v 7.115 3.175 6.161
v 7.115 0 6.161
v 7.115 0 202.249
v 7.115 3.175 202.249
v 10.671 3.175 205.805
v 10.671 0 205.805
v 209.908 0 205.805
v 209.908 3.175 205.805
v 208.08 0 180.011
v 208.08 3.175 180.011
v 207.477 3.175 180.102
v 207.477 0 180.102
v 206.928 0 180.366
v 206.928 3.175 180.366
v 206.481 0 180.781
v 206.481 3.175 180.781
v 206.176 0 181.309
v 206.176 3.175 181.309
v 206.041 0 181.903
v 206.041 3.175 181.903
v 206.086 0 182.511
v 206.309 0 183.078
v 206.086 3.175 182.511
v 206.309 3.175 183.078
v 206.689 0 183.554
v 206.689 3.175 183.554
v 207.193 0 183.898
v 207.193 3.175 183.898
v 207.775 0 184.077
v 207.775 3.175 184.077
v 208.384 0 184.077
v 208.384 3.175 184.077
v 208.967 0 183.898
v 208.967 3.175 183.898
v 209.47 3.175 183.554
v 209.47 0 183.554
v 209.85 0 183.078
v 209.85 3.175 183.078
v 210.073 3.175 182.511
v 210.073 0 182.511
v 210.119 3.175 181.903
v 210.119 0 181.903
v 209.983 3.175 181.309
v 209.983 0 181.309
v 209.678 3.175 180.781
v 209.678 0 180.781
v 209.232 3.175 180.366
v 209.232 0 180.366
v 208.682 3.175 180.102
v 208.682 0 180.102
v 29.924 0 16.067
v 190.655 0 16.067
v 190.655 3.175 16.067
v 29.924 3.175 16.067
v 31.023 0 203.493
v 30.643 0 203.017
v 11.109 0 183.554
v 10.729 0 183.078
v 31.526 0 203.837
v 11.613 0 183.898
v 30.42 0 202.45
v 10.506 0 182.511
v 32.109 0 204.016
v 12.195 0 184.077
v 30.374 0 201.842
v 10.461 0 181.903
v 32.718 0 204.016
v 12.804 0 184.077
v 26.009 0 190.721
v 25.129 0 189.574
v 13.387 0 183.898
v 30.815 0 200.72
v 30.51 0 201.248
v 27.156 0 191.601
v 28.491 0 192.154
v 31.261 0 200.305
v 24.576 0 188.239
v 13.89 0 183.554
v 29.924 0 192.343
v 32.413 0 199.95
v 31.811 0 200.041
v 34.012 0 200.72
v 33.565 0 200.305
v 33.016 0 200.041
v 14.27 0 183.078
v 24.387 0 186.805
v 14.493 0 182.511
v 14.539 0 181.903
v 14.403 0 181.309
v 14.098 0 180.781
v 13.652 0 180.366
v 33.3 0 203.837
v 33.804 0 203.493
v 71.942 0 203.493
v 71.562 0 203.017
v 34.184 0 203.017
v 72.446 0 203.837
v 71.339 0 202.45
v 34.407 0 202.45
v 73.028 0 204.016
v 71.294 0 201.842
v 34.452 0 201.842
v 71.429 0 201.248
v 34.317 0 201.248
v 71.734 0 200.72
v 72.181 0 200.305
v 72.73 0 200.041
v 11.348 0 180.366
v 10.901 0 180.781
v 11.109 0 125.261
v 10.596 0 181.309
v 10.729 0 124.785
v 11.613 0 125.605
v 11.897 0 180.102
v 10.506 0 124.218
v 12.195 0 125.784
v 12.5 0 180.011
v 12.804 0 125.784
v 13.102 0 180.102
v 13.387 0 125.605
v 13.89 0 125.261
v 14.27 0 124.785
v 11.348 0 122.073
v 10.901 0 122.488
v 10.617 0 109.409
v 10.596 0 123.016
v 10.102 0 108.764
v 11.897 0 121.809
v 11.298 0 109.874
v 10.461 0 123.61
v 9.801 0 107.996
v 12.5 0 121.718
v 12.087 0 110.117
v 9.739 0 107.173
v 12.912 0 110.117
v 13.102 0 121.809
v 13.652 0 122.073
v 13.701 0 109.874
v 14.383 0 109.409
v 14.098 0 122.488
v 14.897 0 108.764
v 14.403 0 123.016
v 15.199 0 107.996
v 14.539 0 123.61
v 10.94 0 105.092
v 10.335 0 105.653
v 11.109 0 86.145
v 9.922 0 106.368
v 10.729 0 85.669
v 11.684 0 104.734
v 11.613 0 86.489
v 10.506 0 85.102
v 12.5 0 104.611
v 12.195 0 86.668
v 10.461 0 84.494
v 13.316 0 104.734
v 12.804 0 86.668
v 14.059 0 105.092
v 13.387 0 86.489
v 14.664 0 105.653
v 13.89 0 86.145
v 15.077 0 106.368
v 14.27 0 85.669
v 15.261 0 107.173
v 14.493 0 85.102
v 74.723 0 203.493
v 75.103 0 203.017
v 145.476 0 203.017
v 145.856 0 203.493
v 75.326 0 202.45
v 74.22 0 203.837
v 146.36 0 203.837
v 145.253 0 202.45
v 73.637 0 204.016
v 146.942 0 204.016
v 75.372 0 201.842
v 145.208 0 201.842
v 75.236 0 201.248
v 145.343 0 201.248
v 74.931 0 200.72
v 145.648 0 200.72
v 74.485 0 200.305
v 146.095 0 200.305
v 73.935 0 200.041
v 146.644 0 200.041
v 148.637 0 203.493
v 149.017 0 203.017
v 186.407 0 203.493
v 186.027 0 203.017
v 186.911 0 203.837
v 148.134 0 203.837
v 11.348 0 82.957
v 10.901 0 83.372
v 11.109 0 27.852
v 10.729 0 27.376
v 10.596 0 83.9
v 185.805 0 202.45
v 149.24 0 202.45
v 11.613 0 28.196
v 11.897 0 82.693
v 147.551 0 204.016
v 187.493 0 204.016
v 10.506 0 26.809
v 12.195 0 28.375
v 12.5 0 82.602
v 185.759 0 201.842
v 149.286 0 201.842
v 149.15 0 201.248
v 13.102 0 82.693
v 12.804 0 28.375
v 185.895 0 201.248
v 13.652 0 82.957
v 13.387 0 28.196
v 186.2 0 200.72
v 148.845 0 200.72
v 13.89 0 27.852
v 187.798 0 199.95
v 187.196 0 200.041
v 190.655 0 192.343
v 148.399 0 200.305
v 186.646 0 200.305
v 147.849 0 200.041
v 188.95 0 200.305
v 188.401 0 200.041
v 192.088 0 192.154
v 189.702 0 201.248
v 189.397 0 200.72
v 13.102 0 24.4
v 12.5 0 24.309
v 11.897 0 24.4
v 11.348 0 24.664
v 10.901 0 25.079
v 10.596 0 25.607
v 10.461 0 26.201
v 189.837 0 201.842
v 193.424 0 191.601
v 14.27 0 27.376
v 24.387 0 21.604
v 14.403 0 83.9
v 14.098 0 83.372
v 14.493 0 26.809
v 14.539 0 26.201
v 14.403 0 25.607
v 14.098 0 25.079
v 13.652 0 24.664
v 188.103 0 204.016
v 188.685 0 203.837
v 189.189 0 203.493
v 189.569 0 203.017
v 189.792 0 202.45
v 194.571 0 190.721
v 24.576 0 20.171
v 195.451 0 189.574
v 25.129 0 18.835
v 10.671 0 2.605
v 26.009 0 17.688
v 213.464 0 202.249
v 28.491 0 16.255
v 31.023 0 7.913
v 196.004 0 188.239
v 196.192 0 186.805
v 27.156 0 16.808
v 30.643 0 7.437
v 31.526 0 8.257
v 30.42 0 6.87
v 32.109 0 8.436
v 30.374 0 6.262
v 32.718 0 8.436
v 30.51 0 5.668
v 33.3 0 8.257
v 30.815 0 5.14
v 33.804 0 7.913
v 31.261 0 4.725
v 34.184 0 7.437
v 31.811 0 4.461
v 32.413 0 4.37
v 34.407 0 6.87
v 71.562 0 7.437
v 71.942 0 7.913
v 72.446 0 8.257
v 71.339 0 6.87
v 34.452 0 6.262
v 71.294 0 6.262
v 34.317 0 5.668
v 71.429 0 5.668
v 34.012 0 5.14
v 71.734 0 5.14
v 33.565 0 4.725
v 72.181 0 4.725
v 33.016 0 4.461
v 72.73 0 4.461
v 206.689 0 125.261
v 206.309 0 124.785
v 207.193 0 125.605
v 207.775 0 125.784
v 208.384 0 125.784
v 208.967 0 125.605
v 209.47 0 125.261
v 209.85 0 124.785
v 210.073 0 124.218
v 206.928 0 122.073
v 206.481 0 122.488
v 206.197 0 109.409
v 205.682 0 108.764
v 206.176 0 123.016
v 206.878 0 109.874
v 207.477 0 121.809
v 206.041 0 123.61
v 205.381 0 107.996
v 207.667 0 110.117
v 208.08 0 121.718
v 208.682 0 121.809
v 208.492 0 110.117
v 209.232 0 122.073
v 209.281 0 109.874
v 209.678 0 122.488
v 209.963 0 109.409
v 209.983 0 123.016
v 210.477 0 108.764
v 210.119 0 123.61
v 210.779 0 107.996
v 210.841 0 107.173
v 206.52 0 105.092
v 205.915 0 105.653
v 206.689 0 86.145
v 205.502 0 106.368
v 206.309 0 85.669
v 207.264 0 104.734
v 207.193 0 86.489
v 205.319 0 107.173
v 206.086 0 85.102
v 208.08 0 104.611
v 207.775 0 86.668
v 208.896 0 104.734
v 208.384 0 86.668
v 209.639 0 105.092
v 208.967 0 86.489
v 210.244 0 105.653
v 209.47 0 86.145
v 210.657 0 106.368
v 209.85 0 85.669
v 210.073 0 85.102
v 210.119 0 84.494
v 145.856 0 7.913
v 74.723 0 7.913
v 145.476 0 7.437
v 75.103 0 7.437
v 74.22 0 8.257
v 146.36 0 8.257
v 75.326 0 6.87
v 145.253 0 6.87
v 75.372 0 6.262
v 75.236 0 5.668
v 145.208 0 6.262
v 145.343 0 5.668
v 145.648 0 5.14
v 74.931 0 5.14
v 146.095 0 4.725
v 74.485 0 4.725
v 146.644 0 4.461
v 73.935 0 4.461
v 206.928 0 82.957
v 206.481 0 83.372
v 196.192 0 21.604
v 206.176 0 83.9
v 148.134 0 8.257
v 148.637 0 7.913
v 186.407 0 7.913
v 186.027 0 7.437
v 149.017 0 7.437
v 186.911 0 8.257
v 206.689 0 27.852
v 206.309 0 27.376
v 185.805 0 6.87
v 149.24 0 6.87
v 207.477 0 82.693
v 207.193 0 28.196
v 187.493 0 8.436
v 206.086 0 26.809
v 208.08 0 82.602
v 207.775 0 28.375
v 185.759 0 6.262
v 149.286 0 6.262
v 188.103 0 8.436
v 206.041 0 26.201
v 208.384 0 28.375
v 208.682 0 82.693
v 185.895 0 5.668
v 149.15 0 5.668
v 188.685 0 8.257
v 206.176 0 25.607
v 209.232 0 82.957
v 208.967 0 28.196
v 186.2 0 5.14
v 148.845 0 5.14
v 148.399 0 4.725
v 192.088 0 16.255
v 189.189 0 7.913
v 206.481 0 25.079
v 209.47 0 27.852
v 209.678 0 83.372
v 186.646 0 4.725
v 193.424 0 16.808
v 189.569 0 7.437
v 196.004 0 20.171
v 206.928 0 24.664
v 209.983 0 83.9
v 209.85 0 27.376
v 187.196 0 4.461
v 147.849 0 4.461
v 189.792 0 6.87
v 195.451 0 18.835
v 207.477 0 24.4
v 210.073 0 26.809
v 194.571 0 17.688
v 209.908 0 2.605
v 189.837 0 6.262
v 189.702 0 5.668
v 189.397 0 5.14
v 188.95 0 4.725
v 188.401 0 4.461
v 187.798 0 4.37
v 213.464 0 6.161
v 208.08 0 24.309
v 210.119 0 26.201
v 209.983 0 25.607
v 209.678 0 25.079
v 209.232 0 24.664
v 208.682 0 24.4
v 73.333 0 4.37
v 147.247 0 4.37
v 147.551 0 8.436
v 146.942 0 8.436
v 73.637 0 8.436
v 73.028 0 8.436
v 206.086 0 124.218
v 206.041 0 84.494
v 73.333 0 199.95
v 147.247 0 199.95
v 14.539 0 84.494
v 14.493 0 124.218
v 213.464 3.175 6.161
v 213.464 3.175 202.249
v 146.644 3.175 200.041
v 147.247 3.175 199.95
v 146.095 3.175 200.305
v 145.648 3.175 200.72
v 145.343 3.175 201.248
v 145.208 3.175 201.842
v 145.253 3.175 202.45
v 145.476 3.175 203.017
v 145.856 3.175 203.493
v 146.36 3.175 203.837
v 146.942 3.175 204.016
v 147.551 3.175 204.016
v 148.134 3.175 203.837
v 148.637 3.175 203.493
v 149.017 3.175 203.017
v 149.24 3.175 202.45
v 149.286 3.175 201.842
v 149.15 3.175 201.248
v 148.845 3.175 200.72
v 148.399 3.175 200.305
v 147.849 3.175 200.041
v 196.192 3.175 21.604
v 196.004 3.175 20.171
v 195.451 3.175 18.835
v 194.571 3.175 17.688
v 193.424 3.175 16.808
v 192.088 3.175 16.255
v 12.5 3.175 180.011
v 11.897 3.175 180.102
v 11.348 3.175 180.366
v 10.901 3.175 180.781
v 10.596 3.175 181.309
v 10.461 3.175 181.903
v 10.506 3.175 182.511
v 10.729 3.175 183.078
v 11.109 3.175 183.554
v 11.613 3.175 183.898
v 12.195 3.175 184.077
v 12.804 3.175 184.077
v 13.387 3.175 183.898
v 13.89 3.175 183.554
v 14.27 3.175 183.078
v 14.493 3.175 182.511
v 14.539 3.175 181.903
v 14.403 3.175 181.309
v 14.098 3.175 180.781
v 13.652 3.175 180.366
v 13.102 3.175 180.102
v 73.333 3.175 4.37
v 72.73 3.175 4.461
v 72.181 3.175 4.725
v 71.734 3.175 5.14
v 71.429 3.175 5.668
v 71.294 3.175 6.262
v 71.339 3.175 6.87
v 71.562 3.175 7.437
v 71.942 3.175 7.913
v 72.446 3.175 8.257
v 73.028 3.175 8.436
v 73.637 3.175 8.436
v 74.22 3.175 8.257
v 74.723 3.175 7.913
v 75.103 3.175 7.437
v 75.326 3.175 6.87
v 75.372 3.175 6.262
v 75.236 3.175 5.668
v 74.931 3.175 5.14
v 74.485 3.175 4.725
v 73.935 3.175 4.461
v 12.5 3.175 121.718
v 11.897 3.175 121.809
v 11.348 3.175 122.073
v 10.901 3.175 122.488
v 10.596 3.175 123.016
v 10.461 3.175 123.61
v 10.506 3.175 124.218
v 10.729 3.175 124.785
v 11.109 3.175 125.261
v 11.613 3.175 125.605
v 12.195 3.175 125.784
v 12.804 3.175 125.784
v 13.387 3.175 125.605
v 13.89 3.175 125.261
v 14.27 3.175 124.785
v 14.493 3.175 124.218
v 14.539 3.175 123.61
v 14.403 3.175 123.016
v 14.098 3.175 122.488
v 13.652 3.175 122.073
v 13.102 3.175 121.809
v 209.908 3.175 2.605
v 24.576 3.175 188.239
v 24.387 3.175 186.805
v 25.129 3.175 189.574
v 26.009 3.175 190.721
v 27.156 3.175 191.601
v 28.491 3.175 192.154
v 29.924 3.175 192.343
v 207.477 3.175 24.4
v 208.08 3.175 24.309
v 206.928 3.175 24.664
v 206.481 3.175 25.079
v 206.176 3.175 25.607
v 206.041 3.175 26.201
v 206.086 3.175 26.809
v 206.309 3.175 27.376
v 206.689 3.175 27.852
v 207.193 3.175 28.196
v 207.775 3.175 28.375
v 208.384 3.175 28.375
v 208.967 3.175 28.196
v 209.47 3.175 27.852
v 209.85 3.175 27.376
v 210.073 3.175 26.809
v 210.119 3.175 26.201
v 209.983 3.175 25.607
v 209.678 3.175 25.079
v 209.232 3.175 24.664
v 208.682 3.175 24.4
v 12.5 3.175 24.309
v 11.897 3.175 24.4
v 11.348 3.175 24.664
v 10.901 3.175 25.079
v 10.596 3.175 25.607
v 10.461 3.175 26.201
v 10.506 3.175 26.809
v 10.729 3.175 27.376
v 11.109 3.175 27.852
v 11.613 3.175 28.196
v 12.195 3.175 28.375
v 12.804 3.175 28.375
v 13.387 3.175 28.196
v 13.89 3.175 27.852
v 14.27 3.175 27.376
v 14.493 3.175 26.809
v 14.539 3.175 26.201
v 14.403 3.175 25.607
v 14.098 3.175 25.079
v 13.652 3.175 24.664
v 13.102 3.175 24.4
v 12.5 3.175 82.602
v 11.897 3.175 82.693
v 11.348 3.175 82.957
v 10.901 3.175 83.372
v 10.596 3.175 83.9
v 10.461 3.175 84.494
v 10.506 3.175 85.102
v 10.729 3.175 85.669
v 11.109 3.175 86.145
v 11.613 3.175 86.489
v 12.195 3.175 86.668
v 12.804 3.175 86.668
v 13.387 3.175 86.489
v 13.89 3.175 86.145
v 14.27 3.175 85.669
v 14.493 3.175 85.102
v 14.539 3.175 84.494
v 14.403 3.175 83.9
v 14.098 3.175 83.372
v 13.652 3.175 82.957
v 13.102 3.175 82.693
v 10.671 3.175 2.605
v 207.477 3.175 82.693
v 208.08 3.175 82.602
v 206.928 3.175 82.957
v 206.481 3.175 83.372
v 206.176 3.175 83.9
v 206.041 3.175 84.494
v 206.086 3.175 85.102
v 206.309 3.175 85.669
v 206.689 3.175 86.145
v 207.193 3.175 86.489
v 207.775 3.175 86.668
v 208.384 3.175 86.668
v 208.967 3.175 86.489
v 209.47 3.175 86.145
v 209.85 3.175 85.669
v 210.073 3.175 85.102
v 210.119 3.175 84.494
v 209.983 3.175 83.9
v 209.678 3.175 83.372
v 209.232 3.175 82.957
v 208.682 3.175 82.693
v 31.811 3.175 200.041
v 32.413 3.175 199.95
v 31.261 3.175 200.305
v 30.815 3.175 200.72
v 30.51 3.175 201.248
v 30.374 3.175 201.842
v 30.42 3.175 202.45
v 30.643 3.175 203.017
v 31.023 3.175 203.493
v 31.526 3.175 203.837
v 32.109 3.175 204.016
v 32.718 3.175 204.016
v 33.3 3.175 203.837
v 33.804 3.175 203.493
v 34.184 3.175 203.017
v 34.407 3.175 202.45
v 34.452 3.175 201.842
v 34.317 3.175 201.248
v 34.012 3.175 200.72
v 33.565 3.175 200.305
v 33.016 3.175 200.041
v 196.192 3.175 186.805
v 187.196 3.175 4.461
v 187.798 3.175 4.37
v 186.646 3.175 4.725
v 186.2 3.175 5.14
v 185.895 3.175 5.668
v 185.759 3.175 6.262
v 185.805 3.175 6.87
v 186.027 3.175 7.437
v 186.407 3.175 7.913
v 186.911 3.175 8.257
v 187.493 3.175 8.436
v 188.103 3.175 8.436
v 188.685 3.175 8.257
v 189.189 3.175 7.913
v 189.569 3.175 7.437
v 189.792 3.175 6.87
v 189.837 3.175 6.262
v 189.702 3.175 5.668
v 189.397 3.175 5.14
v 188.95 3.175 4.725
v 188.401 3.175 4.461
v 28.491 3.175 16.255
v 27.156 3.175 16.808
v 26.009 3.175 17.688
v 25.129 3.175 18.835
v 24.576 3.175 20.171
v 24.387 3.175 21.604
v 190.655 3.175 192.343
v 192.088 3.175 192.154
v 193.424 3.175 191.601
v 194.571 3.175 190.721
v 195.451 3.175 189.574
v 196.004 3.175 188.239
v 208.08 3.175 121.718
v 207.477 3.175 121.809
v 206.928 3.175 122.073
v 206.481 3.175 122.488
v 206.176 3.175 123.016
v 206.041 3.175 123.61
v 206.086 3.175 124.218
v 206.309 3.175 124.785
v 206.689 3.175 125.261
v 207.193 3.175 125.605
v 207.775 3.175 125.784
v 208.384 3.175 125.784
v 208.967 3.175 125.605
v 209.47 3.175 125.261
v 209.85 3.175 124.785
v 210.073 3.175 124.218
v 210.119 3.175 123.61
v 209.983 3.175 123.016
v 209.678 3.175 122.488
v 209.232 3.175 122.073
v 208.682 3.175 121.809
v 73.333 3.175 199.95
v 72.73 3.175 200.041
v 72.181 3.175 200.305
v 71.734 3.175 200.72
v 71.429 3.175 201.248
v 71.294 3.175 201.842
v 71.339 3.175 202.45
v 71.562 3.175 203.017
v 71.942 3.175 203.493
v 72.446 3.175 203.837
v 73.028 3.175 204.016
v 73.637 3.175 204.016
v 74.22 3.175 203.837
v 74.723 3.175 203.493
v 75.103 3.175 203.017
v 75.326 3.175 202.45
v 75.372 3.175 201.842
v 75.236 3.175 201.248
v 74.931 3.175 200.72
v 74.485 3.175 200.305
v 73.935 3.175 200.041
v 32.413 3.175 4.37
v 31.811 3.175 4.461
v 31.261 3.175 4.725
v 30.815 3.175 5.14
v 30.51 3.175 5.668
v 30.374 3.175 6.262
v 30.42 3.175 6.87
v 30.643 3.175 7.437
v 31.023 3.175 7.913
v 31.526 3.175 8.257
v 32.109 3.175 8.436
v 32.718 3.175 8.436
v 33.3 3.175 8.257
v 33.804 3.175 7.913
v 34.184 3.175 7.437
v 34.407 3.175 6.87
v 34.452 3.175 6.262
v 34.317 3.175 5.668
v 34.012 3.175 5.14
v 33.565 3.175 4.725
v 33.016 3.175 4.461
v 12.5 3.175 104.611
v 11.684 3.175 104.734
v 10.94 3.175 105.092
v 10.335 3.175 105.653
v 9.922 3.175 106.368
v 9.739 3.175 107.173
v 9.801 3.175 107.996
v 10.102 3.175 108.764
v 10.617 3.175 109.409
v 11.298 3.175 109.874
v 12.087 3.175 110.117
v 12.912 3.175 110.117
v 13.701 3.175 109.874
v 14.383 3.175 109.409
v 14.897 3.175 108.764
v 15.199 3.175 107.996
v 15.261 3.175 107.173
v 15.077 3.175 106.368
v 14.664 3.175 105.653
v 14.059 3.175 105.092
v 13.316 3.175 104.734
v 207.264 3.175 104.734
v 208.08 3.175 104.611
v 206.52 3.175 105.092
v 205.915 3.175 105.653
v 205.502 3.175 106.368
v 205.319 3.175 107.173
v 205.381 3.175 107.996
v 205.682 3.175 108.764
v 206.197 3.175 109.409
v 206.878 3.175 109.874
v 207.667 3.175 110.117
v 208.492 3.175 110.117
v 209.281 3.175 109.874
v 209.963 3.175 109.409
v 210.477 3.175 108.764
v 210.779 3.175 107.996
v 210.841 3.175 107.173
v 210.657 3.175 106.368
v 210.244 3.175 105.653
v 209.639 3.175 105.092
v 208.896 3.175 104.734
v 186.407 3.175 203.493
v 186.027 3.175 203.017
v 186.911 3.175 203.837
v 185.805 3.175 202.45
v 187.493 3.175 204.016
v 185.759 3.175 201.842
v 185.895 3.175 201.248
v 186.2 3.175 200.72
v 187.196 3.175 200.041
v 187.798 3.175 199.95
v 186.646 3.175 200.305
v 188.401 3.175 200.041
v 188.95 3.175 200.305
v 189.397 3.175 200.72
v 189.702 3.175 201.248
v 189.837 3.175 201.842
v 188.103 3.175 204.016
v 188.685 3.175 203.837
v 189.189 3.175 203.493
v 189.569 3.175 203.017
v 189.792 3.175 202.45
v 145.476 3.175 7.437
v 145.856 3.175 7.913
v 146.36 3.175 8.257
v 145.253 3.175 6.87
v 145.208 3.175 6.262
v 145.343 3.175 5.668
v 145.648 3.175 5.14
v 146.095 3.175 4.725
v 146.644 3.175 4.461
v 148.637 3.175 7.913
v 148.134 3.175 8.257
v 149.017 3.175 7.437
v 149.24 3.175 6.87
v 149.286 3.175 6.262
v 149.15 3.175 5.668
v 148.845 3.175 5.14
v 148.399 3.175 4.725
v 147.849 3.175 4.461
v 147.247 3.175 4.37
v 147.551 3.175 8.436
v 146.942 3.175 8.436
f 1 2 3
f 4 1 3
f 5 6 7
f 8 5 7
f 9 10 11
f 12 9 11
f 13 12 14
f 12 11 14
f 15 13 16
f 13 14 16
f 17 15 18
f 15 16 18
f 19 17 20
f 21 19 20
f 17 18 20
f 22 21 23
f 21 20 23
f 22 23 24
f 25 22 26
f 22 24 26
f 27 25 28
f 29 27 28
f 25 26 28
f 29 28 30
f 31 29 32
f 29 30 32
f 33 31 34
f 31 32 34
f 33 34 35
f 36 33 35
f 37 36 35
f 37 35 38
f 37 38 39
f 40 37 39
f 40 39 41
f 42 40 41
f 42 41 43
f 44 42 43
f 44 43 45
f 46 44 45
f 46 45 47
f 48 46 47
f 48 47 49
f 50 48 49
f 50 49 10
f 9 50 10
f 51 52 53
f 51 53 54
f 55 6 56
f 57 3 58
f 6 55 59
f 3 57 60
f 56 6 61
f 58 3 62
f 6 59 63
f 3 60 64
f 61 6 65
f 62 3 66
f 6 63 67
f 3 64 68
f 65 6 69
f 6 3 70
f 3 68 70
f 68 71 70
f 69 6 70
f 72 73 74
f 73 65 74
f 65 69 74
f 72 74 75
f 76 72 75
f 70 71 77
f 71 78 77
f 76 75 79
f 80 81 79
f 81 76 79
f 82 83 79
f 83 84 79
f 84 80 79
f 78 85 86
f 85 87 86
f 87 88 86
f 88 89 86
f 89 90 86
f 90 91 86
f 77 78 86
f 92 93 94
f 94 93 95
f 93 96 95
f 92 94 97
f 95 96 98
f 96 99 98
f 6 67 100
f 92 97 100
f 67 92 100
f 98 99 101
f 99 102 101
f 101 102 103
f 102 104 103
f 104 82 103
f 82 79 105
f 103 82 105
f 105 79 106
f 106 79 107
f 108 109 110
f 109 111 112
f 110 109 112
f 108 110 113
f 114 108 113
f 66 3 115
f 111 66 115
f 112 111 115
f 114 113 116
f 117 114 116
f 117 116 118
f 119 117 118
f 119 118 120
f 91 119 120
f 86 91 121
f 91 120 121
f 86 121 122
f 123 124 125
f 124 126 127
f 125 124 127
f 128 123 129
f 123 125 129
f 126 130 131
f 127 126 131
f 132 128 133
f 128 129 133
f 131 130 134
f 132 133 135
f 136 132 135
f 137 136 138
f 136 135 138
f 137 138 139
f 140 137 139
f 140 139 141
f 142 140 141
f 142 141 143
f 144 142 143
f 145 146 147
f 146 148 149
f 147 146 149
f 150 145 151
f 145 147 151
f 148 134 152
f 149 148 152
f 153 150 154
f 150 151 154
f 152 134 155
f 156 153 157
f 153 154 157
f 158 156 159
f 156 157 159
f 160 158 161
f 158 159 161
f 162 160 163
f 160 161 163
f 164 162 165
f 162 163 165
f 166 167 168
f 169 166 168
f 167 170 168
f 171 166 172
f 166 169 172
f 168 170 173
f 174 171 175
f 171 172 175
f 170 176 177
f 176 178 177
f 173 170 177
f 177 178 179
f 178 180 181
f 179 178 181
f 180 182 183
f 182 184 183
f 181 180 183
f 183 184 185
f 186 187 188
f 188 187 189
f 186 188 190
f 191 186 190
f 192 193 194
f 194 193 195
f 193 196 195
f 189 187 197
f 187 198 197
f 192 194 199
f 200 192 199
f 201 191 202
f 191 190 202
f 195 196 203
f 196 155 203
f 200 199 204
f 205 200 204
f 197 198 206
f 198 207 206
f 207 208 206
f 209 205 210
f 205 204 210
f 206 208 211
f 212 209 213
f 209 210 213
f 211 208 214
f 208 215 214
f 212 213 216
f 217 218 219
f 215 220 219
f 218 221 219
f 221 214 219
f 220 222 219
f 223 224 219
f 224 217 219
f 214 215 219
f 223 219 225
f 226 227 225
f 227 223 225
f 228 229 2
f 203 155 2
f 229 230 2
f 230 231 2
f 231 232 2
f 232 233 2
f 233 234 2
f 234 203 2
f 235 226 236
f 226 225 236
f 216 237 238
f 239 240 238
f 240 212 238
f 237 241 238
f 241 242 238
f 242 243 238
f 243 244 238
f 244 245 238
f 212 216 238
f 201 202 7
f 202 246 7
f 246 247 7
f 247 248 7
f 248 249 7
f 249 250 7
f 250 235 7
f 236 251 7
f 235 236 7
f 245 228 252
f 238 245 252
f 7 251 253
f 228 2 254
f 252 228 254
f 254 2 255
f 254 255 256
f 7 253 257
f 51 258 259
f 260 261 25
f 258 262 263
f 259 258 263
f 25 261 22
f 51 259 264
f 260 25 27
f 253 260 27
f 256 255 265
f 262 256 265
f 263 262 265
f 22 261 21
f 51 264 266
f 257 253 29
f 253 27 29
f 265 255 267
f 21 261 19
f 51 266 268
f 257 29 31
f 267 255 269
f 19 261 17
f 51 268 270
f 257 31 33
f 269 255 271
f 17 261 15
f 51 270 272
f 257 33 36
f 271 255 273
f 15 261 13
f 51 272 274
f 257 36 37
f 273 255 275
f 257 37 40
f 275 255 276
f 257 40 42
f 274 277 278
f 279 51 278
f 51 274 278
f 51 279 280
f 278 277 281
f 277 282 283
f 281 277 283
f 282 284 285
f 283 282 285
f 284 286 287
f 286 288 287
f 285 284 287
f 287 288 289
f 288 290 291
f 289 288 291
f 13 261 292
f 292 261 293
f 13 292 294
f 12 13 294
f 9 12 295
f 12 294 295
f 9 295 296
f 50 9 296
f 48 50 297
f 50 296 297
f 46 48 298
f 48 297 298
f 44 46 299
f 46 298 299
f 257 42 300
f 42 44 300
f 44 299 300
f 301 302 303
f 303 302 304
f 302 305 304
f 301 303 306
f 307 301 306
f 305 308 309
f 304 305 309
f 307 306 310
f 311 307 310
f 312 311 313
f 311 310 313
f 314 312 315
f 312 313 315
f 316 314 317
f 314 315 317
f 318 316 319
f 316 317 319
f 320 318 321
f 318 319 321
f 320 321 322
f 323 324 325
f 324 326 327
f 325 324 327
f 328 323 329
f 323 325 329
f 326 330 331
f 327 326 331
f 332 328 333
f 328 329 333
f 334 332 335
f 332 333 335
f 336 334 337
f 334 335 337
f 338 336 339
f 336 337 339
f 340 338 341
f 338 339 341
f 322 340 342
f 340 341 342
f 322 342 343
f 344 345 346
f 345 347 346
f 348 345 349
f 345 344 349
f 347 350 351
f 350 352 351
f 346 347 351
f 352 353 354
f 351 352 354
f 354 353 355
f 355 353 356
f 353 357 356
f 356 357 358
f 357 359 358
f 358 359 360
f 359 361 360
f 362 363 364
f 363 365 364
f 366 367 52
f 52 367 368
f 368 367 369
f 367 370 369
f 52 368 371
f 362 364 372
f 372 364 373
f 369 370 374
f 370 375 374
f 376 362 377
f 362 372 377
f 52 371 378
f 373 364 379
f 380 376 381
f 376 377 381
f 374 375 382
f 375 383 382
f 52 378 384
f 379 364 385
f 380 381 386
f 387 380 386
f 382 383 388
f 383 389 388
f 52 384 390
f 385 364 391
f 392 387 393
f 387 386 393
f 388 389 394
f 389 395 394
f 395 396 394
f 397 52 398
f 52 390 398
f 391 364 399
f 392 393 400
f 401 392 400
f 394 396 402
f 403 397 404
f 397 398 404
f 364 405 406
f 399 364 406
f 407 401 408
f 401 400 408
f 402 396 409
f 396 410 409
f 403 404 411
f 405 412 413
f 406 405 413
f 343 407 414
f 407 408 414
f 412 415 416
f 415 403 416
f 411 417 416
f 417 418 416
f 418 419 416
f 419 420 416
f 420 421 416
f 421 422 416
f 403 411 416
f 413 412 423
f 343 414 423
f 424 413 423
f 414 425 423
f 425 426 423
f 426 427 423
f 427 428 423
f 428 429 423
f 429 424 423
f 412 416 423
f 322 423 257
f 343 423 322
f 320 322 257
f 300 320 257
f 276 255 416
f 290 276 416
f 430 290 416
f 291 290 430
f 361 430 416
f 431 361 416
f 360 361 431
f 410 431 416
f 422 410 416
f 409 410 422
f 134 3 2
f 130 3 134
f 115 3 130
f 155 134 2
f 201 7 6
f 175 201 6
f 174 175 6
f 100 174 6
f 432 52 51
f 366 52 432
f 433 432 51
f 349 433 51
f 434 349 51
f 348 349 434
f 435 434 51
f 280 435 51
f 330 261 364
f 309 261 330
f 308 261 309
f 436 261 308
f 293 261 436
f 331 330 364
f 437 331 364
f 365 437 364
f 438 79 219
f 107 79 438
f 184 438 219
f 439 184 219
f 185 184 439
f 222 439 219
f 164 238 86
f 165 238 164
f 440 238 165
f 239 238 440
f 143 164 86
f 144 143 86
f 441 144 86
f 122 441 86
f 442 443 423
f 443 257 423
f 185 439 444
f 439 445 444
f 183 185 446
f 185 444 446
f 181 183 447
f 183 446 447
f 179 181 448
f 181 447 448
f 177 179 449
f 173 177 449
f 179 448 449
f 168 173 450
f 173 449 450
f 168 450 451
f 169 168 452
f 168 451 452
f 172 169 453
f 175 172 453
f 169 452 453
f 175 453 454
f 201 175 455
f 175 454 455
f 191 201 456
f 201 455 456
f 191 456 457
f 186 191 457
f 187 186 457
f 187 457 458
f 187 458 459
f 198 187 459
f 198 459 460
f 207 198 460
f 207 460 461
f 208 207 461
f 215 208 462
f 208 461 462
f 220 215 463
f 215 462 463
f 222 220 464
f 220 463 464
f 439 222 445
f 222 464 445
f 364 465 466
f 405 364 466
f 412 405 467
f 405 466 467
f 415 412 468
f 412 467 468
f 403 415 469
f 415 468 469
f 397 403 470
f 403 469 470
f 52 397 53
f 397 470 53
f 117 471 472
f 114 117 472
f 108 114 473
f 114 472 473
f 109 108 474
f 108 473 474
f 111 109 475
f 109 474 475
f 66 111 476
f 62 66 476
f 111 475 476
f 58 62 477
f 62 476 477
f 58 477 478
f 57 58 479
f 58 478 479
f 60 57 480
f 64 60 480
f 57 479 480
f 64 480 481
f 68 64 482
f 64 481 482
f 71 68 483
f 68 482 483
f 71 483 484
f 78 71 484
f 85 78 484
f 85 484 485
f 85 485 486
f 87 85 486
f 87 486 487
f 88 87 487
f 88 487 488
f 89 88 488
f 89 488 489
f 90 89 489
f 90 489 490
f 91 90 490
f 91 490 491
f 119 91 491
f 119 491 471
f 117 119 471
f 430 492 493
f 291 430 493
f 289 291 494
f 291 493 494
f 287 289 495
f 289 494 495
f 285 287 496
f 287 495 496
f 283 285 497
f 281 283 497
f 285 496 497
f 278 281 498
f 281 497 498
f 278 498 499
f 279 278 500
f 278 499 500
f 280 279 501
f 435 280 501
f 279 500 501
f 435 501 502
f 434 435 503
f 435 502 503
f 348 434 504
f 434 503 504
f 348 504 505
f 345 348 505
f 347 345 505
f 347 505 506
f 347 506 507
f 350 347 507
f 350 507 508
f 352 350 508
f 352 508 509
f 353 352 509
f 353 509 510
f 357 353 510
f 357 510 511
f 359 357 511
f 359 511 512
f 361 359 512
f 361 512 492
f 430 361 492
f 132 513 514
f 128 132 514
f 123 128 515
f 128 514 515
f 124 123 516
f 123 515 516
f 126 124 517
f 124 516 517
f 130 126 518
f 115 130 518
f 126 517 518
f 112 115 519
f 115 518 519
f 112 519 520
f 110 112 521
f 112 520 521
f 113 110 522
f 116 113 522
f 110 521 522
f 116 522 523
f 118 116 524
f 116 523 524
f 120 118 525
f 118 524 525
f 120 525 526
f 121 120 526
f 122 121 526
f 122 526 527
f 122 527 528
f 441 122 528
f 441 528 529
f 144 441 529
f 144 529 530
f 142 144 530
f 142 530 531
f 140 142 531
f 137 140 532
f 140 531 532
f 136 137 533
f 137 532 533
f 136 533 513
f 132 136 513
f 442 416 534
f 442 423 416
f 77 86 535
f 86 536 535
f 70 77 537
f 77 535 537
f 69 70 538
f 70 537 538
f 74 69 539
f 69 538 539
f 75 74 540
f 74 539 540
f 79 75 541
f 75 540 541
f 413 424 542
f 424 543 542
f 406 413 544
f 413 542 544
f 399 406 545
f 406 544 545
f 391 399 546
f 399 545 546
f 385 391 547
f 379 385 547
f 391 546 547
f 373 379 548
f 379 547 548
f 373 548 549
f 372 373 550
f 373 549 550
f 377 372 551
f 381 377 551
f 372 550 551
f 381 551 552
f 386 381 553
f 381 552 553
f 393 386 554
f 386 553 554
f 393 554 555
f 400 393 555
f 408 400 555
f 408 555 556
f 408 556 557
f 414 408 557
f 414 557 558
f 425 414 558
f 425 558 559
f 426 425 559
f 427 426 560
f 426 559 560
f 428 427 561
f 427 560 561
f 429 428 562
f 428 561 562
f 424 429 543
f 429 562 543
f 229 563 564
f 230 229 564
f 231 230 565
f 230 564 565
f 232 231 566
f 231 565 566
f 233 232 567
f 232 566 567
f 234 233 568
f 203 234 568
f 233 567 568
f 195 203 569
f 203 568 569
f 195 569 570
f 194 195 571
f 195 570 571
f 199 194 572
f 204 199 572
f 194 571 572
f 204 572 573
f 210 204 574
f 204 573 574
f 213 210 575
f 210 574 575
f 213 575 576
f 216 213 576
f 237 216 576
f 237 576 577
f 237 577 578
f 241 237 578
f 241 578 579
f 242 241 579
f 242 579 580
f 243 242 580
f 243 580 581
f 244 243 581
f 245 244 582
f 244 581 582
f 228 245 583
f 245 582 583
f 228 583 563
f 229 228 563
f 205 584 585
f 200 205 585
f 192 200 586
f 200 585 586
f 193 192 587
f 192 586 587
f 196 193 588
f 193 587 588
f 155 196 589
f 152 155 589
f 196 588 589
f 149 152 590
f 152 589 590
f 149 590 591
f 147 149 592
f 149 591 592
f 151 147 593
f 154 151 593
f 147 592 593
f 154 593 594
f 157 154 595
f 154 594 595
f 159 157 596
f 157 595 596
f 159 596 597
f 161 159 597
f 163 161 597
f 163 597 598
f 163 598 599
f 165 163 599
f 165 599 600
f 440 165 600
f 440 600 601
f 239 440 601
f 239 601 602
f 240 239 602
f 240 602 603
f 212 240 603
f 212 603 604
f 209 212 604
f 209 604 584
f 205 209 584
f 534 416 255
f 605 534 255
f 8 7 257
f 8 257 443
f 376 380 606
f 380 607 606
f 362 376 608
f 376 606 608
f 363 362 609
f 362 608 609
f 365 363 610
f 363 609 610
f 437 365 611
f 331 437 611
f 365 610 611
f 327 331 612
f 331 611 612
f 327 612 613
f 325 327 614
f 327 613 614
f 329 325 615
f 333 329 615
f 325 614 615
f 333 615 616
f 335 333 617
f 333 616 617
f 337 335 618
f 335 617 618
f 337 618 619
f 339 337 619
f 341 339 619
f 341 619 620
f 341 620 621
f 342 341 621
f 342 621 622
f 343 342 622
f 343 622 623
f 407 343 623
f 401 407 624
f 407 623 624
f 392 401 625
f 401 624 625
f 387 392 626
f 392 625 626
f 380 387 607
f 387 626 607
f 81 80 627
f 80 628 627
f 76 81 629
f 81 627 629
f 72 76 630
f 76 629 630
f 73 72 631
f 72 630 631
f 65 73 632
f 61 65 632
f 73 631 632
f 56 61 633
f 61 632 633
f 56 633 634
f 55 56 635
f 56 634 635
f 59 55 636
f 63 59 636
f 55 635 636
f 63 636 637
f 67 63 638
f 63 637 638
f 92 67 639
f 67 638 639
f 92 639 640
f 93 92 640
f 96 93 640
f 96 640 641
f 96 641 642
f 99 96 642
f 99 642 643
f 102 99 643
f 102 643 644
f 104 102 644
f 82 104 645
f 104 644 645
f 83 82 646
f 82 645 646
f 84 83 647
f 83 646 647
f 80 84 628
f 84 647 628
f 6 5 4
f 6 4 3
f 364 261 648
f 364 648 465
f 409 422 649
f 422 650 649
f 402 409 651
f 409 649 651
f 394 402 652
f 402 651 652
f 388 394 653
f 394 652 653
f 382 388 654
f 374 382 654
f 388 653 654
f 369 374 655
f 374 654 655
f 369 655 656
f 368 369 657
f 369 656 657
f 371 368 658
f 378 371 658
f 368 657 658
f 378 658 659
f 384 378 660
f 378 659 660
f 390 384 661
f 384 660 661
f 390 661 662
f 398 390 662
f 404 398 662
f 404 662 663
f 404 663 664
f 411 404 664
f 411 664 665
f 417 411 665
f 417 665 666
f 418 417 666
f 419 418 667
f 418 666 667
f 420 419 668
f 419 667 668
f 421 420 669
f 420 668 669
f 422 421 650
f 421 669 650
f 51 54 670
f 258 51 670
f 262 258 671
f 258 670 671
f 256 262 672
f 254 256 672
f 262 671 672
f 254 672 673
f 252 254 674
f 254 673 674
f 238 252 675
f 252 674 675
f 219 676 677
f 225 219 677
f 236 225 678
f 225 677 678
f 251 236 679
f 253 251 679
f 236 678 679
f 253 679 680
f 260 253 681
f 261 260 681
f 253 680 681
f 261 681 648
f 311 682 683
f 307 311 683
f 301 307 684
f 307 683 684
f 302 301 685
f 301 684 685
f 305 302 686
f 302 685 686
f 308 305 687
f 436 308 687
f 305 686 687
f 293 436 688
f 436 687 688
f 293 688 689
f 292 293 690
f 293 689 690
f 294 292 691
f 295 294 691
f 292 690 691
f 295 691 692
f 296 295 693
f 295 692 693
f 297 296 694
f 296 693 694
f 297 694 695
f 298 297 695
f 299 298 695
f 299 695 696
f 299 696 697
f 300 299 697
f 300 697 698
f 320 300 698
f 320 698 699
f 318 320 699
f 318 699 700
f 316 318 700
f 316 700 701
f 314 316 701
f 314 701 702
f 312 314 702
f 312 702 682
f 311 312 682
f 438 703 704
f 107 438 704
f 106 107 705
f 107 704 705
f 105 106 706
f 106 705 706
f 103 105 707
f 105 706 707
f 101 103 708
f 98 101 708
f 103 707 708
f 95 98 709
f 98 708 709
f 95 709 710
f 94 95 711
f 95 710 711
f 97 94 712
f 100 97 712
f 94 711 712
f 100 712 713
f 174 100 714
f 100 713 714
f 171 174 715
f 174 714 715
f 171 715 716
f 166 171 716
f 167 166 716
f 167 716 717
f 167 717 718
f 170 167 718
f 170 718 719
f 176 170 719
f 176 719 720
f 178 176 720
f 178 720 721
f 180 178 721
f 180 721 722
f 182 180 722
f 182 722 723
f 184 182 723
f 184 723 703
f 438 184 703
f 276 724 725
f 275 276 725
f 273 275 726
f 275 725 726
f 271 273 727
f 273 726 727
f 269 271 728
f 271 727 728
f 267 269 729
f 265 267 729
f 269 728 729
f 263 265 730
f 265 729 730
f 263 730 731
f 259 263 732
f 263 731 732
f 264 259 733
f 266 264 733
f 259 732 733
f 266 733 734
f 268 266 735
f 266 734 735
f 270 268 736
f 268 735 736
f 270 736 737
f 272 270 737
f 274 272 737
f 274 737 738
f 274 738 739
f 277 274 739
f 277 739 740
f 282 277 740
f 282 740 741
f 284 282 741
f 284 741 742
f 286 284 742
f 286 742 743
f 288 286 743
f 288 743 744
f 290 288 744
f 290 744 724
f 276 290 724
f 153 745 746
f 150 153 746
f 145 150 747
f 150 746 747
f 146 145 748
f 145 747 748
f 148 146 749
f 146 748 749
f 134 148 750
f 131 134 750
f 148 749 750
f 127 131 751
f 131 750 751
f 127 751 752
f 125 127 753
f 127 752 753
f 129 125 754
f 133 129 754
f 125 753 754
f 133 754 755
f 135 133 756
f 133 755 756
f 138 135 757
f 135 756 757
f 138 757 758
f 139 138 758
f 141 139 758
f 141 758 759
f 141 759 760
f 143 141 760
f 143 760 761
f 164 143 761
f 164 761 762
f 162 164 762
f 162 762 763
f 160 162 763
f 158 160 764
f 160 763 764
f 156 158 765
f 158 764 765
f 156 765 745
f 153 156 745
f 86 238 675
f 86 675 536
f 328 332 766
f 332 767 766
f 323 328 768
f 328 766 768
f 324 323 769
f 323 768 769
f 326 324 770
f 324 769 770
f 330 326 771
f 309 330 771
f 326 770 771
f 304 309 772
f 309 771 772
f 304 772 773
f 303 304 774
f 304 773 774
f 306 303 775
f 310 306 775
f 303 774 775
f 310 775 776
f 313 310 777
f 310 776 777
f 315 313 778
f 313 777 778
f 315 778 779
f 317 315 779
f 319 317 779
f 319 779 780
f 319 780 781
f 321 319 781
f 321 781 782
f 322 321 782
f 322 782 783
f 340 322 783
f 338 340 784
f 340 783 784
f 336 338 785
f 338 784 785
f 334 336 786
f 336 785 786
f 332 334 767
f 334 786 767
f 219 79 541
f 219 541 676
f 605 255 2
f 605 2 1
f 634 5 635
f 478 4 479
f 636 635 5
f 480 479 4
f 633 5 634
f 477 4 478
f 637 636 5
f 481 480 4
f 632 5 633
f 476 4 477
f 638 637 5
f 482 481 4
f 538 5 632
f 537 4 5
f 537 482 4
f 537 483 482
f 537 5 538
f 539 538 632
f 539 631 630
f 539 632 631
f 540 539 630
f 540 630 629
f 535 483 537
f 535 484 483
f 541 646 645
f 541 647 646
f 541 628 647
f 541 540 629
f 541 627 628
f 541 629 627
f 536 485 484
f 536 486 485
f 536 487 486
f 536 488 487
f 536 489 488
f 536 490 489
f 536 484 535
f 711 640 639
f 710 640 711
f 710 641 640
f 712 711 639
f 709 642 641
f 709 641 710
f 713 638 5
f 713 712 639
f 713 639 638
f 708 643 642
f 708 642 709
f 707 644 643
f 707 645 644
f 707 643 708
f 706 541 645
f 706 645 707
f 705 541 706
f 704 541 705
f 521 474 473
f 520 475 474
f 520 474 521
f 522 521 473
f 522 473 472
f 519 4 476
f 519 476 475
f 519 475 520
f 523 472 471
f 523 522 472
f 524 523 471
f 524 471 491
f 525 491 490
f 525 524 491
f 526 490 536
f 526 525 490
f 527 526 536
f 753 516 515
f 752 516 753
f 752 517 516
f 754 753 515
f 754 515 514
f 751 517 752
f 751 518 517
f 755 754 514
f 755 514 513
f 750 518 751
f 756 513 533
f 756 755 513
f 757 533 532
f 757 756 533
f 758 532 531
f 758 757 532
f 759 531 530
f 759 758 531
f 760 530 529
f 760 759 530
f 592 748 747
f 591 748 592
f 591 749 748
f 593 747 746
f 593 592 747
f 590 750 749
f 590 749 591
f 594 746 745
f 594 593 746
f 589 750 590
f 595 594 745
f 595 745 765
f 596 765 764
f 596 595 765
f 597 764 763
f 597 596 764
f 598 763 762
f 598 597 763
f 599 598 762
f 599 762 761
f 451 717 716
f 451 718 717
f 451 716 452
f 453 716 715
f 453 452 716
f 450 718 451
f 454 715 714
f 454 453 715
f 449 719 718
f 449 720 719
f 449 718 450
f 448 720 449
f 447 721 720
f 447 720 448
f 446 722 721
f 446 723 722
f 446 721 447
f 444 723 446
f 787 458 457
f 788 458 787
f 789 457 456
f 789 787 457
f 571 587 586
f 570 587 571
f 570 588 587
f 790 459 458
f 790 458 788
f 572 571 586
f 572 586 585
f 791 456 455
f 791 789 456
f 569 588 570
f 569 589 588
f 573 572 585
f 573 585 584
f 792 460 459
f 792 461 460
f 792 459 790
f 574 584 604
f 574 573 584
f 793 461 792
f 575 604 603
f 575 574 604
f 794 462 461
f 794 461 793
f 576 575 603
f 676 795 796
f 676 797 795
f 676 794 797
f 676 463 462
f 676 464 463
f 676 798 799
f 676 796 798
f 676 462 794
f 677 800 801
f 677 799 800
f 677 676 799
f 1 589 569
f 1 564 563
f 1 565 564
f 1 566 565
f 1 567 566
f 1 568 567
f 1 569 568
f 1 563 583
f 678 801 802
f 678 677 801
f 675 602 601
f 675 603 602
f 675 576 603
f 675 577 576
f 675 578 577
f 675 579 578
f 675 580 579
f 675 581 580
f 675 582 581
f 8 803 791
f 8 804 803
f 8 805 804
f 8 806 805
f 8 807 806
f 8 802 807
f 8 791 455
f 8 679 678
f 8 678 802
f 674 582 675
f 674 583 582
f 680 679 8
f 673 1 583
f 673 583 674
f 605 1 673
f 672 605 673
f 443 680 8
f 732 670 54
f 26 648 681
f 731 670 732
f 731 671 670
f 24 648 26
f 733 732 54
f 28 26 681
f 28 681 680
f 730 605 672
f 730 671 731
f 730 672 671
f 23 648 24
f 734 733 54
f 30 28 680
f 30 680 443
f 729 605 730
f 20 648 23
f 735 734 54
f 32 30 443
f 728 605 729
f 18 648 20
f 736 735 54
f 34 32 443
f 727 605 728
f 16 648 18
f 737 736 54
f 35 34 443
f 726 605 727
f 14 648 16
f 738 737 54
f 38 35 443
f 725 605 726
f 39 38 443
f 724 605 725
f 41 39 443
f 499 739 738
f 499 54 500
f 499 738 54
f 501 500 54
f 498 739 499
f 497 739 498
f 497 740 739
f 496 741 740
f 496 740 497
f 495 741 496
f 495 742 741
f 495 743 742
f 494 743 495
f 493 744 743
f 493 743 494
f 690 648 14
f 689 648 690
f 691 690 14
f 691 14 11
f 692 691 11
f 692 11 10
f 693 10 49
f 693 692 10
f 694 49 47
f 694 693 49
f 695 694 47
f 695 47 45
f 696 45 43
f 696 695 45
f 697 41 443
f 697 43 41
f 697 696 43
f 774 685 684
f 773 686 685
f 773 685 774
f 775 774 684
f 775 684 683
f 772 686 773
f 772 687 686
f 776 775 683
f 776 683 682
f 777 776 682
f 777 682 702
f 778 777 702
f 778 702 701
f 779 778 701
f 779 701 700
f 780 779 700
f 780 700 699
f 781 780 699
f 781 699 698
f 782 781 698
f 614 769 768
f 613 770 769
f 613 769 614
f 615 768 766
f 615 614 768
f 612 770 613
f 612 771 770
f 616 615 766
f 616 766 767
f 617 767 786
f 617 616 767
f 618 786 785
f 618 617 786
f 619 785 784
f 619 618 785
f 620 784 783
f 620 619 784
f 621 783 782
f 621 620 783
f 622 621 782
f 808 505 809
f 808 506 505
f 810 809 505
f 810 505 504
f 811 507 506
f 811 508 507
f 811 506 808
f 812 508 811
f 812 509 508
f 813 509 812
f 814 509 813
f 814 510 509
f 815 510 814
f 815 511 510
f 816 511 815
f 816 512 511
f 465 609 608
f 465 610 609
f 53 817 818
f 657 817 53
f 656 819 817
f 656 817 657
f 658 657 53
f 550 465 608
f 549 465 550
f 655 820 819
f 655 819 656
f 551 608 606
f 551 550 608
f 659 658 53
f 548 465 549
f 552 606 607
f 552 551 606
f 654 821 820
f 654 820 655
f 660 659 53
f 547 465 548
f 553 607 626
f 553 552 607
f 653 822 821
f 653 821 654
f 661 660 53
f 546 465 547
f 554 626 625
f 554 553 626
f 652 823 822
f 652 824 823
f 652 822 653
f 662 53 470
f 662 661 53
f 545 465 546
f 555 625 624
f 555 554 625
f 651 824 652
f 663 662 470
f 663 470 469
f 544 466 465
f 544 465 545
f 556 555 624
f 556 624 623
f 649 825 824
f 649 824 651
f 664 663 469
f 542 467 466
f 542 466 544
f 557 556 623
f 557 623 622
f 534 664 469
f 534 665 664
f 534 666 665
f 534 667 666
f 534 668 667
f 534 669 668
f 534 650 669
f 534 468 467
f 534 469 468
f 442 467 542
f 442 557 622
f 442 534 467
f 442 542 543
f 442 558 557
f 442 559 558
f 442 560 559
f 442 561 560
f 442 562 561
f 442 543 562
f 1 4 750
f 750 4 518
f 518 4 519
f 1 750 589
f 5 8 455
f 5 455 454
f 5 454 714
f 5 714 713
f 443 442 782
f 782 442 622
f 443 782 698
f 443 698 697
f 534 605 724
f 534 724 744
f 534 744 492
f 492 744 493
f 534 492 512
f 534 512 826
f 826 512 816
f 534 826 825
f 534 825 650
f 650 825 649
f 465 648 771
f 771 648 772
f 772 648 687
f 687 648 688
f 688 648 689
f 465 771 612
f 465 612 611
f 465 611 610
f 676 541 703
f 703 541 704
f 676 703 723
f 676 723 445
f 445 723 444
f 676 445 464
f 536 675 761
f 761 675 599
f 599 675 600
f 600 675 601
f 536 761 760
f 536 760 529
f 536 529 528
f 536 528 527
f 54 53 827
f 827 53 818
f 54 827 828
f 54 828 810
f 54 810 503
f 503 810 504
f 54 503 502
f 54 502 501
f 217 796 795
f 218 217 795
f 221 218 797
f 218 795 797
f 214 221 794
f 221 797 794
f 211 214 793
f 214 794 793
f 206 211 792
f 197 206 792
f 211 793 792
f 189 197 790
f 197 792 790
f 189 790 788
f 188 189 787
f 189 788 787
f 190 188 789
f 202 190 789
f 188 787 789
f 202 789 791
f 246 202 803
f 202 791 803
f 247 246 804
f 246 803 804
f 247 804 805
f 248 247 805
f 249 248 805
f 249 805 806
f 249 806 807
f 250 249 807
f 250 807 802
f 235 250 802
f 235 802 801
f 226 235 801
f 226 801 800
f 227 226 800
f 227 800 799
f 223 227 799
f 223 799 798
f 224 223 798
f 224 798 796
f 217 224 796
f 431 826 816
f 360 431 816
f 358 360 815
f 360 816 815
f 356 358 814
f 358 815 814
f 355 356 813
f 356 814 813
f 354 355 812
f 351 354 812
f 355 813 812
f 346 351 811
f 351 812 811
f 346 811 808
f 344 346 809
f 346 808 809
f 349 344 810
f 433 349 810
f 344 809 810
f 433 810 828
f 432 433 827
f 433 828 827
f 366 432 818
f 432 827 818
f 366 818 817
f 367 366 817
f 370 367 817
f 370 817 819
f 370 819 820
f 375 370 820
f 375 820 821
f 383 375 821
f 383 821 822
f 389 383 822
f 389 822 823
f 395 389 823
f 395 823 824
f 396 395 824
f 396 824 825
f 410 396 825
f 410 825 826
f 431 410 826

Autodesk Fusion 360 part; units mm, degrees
sketch "Front" plane through (0, 0, 0) normal (0, 1, 0) x (1, 0, 0) in component "1006350A"
  line L0 (-97.5923, -201.9946) -> (221.2351, -201.9946) construction
  line L1 (-99.947, -6.4146) -> (290.3014, -6.4146) construction
  line L2 (12.4997, 61.7326) -> (12.4997, -271.4585) construction
  line L3 (208.0797, 69.9741) -> (208.0797, -187.16) construction
  line L4 (213.4645, 13.4611) -> (213.4645, -265.3363) construction
  line L5 (7.1149, -256.6239) -> (7.1149, 6.397) construction
  line L6 (-10.9391, -2.6046) -> (257.2621, -2.6046) construction
  line L7 (3.4246, -205.8046) -> (275.1579, -205.8046) construction
  line L8 (196.1925, -231.664) -> (196.1925, 4.0423) construction
  line L9 (200.5105, 72.0933) -> (200.5105, -273.8132) construction
  line L10 (20.3229, -271.4585) -> (20.3229, 19.5833) construction
  line L11 (-9.5263, -26.3536) -> (218.174, -26.3536) construction
  line L12 (-30.2477, -84.6466) -> (216.2902, -84.6466) construction
  line L13 (226.8864, -107.3796) -> (-21.2998, -107.3796) construction
  line L14 (-47.6725, -123.7626) -> (220.7641, -123.7626) construction
  line L15 (-72.1615, -182.0556) -> (219.1158, -182.0556) construction
  line L16 (-7.1716, -192.3426) -> (237.718, -192.3426) construction
  line L17 (24.3869, -243.673) -> (24.3869, 8.2807) construction
  line L18 (187.7982, 11.5773) -> (187.7982, -213.2972) construction
  line L19 (147.2467, 23.5863) -> (147.2467, -210.9425) construction
  line L20 (73.3327, 36.3018) -> (73.3327, -224.8353) construction
  line L21 (32.4133, 51.8428) -> (32.4133, -217.3002) construction
  line L22 (267.4197, -11.8756) -> (2.5805, -11.8756) construction
  line L23 (267.0325, -196.4066) -> (1.4189, -196.4066) construction
  line L24 (1.5972, -16.0666) -> (220.1148, -16.0666) construction
  line L25 (7.1149, -205.8046) -> (213.4645, -205.8046)
  line L26 (213.4645, -205.8046) -> (213.4645, -2.6046)
  line L27 (213.4645, -2.6046) -> (7.1149, -2.6046)
  line L28 (7.1149, -2.6046) -> (7.1149, -205.8046)
  line L29 (24.3869, -192.3426) -> (196.1925, -192.3426)
  line L30 (196.1925, -192.3426) -> (196.1925, -16.0666)
  line L31 (196.1925, -16.0666) -> (24.3869, -16.0666)
  line L32 (24.3869, -16.0666) -> (24.3869, -192.3426)
  point P0 (32.4133, -201.9946)
  point P1 (73.3327, -201.9946)
  point P2 (147.2467, -201.9946)
  point P3 (187.7982, -201.9946)
  point P4 (208.0797, -182.0556)
  point P5 (208.0797, -123.7626)
  point P6 (208.0797, -107.3796)
  point P7 (208.0797, -84.6466)
  point P8 (208.0797, -26.3536)
  point P9 (187.7982, -6.4146)
  point P10 (147.2467, -6.4146)
  point P11 (73.3327, -6.4146)
  point P12 (32.4133, -6.4146)
  point P13 (12.4997, -26.3536)
  point P14 (12.4997, -84.6466)
  point P15 (12.4997, -107.3796)
  point P16 (12.4997, -123.7626)
  point P17 (12.4997, -182.0556)
  dimension "d1" = 195.58
  dimension "d2" = 3.81
  dimension "d3" = 19.939
  dimension "d4" = 78.232
  dimension "d5" = 117.348
  dimension "d6" = 175.641
  dimension "d7" = 100.965
  dimension "d10" = 5.3848
  dimension "d11" = 17.272
  dimension "d12" = 60.833
  dimension "d13" = 134.747
  dimension "d14" = 175.6664
  dimension "d15" = 195.58
  dimension "d16" = 203.2
  dimension "d17" = 184.531
  dimension "d18" = 5.461
  dimension "d19" = 13.462
  dimension "d20" = 189.0776
  dimension "d21" = 206.3496
  dimension "d22" = 13.462
  dimension "d33" = 7.5692
  dimension "d34" = 180.1876
extrude "Extrude1" add sketch "Front" along normal blind 3.175 in component "1006350A"
chamfer "Chamfer1" distance 3.556 angle 45 4 edges at (7.1149, 1.5875, 205.8046) (213.4645, 1.5875, 205.8046) (213.4645, 1.5875, 2.6046) (7.1149, 1.5875, 2.6046) in component "1006350A"
fillet "Fillet1" radius 5.5372 4 edges at (196.1925, 1.5875, 192.3426) (24.3869, 1.5875, 192.3426) (24.3869, 1.5875, 16.0666) (196.1925, 1.5875, 16.0666) in component "1006350A"
hole "Hole1" at (12.4997, 0, 107.3796) at (208.0797, 0, 107.3796) direction (0, 1, 0) diameter 5.5372 end through all in component "1006350A"
hole "Hole2" at (147.2467, 0, 201.9946) at (187.7982, 0, 201.9946) at (208.0797, 0, 182.0556) at (208.0797, 0, 123.7626) at (73.3327, 0, 201.9946) at (32.4133, 0, 201.9946) at (12.4997, 0, 182.0556) at (12.4997, 0, 123.7626) at (12.4997, 0, 84.6466) at (12.4997, 0, 26.3536) at (32.4133, 0, 6.4146) at (73.3327, 0, 6.4146) at (147.2467, 0, 6.4146) at (187.7982, 0, 6.4146) at (208.0797, 0, 26.3536) at (208.0797, 0, 84.6466) direction (0, 1, 0) diameter 4.0894 end through all in component "1006350A"
component "1006350A" placed x (1, 0, 0) y (0, 1, 0) z (0, 0, 1) at (0, 0, 0)
